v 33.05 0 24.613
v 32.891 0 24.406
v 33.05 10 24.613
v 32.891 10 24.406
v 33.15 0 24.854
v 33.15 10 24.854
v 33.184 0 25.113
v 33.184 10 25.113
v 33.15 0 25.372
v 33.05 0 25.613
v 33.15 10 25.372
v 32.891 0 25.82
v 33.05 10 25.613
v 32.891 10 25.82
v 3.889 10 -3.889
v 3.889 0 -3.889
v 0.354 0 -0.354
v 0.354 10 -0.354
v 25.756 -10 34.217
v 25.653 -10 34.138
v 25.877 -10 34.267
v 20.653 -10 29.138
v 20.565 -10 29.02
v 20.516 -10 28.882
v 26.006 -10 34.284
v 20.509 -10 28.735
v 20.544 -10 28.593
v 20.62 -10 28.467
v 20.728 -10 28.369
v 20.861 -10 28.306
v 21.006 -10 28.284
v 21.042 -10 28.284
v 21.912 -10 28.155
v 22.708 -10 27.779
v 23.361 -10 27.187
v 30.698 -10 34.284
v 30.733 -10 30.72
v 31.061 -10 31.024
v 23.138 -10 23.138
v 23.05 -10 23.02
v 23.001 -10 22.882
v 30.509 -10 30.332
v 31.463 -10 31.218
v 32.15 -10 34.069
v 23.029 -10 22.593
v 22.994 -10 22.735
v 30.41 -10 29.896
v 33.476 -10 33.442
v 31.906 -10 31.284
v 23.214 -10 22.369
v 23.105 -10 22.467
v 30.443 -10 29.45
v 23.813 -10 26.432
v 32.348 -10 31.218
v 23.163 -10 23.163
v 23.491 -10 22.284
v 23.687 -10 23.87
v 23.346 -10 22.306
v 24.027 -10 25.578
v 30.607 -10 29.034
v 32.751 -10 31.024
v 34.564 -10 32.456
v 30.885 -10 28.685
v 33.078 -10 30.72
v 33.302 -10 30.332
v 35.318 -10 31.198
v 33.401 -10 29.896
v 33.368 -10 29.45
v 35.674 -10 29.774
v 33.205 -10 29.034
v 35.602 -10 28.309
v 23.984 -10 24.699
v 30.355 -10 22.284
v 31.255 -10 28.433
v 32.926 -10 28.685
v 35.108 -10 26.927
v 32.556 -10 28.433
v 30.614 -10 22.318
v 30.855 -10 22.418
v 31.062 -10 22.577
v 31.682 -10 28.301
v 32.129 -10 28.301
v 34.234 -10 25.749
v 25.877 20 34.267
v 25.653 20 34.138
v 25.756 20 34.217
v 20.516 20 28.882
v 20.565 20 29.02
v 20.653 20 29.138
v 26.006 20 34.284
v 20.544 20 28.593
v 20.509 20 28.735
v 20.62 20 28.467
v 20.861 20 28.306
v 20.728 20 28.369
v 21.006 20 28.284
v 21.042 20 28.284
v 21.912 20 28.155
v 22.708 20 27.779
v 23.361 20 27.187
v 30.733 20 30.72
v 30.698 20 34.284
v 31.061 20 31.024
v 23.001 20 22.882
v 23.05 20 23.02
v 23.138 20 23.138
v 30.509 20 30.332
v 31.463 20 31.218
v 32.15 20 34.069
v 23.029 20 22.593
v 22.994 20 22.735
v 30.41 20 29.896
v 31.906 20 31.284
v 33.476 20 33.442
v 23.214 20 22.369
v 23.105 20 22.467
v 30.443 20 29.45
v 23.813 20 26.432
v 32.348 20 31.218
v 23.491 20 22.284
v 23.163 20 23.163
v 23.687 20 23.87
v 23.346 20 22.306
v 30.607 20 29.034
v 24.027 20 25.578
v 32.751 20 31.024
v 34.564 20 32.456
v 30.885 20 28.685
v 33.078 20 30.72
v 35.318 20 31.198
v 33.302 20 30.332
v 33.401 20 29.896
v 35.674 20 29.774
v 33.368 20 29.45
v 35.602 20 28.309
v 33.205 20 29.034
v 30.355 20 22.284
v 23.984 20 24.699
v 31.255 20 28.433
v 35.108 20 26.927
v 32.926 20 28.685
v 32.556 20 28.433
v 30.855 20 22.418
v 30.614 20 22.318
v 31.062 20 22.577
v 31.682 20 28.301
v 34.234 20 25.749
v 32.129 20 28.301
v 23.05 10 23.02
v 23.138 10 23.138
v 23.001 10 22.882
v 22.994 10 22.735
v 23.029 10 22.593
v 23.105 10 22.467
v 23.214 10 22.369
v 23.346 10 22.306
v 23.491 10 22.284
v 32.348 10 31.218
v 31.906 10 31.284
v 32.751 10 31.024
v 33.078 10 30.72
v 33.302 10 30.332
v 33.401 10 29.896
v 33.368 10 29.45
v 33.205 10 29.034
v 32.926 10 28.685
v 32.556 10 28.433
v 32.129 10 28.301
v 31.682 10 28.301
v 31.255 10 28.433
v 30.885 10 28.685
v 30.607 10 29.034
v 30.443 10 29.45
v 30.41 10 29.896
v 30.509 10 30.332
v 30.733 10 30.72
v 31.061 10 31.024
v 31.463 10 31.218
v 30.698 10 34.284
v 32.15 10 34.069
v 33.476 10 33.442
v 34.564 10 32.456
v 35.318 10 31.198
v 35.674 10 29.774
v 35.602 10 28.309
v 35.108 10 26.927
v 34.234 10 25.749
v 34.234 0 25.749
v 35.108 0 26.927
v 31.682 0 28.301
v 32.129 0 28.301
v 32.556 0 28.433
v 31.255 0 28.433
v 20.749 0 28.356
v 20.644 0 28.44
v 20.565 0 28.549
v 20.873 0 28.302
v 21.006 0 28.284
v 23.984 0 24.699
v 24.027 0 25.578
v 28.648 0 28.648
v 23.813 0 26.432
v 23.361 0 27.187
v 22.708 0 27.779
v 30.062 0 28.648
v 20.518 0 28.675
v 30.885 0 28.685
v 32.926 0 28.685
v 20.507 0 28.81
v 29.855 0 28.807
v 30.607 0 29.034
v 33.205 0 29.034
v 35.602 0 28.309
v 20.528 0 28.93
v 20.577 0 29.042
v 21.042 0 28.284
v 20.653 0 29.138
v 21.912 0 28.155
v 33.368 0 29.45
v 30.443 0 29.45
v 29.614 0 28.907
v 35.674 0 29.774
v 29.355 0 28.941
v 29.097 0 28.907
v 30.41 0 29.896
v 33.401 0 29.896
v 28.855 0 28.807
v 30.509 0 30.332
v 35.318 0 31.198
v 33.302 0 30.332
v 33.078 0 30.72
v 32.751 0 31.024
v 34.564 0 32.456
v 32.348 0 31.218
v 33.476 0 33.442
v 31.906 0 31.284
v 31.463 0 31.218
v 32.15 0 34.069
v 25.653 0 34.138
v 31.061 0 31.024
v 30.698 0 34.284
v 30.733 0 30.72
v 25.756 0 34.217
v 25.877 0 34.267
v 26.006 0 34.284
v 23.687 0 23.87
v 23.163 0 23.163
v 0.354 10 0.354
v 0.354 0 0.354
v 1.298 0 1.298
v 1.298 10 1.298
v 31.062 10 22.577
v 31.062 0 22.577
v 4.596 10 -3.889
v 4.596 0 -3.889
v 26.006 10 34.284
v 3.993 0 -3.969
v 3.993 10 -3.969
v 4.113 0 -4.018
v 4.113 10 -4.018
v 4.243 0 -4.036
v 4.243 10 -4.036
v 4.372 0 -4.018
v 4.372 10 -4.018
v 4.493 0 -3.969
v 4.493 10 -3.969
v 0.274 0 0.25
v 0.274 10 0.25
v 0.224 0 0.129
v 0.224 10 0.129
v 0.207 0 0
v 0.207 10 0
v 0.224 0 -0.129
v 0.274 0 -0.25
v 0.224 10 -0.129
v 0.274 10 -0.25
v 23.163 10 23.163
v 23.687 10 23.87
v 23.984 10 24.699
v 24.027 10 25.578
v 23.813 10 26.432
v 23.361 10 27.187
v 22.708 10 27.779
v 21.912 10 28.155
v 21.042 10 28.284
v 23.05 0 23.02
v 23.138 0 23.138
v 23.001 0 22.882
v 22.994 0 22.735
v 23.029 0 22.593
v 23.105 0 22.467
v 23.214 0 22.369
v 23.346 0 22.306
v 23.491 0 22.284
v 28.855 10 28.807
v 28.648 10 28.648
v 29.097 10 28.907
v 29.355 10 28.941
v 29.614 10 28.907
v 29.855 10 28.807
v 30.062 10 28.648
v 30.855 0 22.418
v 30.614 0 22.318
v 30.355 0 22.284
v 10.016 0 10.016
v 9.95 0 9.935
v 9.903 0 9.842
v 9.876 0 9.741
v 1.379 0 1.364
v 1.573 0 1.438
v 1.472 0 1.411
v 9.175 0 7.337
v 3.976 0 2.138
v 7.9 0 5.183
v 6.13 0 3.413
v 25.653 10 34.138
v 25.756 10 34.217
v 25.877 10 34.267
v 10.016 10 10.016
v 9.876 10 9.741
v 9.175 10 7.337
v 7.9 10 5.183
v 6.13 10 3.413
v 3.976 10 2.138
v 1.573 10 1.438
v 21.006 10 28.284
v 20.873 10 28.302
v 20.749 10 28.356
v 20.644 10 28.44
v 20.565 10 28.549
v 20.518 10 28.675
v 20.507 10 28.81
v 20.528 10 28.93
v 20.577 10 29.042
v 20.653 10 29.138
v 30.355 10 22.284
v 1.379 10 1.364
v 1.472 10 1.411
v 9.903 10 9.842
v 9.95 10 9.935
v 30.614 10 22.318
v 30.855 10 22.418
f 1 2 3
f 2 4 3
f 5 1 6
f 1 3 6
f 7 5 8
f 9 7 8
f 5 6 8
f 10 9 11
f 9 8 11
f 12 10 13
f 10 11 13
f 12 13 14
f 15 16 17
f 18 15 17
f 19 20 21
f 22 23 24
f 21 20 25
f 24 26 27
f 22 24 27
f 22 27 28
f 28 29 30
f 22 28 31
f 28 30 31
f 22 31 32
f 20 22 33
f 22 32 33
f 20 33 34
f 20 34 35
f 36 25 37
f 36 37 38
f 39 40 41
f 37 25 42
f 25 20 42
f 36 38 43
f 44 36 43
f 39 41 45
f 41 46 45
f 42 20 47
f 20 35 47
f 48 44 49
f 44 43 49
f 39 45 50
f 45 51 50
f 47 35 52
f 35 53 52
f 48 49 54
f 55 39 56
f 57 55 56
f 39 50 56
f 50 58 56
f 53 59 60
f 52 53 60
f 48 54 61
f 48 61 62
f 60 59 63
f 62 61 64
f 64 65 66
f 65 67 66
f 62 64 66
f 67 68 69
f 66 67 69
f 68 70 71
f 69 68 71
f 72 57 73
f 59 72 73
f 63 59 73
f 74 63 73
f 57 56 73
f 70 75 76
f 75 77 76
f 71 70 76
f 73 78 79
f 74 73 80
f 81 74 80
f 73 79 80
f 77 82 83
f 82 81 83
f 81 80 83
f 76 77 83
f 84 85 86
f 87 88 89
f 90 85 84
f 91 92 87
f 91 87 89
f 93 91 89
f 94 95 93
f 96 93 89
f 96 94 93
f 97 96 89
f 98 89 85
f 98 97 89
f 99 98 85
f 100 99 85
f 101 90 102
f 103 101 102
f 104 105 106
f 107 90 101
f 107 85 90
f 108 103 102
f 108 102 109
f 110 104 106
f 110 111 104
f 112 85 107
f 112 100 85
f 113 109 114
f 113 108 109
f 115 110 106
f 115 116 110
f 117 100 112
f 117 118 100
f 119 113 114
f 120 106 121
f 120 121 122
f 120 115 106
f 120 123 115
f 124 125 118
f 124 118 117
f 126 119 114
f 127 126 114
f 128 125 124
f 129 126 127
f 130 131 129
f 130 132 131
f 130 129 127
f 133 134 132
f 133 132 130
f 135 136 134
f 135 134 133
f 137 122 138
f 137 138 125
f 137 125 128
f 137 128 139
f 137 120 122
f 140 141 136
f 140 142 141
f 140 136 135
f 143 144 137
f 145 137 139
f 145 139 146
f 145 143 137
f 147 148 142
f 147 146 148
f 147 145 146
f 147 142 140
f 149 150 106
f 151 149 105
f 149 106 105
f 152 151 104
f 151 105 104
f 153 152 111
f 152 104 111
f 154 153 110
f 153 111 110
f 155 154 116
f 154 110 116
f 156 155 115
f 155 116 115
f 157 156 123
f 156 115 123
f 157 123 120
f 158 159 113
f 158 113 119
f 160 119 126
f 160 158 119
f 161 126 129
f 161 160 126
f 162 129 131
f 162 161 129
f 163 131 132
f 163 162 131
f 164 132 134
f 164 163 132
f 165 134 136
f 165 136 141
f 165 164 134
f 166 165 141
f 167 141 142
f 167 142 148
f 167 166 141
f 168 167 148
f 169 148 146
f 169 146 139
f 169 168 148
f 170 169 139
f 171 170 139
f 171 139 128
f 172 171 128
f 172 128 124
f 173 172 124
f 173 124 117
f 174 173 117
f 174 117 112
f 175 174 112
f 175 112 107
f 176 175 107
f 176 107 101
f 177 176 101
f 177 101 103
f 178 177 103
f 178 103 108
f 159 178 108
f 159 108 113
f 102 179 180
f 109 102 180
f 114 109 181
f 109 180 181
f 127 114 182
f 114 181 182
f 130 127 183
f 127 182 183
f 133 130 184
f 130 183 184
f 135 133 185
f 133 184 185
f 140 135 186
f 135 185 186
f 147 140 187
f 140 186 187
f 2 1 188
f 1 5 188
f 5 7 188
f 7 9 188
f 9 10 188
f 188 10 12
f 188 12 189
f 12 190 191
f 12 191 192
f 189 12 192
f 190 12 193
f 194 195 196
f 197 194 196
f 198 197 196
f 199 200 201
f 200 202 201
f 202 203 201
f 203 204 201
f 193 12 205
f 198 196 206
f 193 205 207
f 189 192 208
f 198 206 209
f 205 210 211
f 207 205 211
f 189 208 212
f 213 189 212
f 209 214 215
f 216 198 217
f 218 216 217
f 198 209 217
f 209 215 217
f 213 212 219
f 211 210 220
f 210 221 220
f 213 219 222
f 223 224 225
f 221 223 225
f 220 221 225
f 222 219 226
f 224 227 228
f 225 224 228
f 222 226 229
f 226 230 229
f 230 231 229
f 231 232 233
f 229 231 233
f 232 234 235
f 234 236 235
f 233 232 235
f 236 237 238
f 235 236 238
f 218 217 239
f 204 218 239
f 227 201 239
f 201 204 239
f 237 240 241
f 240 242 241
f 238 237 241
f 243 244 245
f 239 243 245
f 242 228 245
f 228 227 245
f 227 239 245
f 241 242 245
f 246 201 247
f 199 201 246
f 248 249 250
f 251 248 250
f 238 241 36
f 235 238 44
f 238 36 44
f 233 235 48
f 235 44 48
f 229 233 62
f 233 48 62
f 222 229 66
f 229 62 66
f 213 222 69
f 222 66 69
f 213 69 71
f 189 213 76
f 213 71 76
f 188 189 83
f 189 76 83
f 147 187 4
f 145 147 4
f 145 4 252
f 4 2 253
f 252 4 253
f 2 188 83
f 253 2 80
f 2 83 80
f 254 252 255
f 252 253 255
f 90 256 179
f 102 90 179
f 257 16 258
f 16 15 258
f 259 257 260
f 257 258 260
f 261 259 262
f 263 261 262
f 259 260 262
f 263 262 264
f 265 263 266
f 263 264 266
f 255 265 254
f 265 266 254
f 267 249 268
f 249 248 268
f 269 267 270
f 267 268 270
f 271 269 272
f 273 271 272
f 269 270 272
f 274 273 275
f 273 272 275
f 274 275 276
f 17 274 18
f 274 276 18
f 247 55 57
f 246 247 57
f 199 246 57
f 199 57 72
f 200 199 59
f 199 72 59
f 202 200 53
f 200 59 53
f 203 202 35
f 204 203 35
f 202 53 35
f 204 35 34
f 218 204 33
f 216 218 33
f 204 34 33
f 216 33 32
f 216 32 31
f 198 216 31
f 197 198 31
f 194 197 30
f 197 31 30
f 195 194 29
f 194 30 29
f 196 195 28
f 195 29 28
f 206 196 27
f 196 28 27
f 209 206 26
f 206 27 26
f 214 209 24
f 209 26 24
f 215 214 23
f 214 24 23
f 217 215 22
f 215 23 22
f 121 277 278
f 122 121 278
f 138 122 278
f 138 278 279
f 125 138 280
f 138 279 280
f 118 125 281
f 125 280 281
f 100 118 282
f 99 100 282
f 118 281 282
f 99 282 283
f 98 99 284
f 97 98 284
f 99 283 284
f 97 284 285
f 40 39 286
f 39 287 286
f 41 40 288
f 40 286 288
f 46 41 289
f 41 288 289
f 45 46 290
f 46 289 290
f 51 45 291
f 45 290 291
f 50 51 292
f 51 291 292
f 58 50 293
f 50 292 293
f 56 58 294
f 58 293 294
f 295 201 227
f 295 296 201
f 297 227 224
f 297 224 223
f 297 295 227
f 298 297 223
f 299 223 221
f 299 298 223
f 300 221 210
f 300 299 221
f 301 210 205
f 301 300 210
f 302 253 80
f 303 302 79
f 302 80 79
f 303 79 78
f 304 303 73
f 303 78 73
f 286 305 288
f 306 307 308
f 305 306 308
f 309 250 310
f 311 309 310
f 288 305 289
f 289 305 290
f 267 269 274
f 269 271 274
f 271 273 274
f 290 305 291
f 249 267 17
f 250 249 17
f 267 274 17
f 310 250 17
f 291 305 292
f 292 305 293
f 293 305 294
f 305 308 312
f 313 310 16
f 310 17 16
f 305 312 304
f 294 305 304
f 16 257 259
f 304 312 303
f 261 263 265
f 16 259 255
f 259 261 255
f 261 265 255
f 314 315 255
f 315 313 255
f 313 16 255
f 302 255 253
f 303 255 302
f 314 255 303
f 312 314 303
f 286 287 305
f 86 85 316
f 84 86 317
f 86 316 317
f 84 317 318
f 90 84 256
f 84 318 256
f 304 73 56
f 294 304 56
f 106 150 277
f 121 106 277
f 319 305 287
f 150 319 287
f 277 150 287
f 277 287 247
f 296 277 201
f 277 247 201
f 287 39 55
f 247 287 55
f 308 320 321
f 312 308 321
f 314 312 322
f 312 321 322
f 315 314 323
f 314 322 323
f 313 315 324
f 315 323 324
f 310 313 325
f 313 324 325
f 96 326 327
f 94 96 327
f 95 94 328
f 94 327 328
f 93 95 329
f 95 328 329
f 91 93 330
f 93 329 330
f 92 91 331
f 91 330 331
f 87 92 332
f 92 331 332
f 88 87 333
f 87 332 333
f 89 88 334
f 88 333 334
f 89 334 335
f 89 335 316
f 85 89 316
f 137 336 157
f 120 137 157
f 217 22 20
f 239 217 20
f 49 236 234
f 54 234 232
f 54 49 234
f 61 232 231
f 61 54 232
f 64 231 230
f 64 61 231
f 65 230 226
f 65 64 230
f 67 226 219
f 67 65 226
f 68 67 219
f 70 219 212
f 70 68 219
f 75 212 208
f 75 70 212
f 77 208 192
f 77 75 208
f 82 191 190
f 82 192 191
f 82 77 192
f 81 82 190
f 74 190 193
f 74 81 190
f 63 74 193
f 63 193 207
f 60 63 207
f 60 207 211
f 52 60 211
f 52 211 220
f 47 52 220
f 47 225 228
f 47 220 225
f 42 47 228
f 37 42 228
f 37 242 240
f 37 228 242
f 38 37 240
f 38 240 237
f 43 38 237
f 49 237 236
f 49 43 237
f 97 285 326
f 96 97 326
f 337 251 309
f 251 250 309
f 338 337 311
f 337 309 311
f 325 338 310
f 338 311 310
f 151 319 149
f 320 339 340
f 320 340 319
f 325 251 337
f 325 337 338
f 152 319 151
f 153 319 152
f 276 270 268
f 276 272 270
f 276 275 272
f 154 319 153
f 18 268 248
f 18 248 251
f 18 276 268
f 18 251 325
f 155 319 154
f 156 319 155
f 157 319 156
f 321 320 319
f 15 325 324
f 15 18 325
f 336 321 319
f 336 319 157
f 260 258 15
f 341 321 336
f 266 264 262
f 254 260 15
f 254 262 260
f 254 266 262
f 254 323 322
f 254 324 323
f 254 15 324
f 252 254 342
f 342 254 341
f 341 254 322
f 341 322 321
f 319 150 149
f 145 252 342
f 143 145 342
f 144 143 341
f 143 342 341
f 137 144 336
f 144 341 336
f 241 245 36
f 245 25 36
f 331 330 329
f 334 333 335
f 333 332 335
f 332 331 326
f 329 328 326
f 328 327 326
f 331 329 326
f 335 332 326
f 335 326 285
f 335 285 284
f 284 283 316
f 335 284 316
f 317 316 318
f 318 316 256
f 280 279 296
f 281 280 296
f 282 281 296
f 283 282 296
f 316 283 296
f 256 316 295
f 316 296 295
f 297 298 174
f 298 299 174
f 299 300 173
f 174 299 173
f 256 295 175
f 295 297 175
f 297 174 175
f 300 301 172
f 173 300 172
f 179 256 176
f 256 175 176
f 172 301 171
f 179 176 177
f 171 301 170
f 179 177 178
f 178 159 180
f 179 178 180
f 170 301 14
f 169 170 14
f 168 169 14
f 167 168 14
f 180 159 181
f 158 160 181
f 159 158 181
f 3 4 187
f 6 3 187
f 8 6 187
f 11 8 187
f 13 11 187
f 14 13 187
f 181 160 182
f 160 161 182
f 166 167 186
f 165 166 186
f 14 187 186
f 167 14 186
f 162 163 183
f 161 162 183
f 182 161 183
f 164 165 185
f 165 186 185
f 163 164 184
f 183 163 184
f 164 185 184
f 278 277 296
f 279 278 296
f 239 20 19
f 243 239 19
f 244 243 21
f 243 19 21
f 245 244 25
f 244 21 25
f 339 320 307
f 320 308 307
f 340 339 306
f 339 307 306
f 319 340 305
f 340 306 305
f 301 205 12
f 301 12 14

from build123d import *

# Parameters (mm, degrees)
SKETCH1_R                = 1.6
BOSS_EXTRUDE1_DEPTH      = 10
CUT_EXTRUDE1_DEPTH       = 51.495476
FILLET1_R                = 0.5
BOSS_EXTRUDE2_DEPTH      = 10
BOSS_EXTRUDE2_DEPTH_BACK = 20
SKETCH3_R                = 1.5
SKETCH4_W                = 10
SKETCH4_H                = 10
CUT_EXTRUDE3_DEPTH       = 54.383453
SKETCH5_W                = 8.66368
SKETCH5_H                = 10
CUT_EXTRUDE5_DEPTH       = 54.831153
FILLET3_R                = 0.5
FILLET4_R                = 1


with BuildPart() as part:
    # Sketch1 → Boss-Extrude1 (new body)
    with BuildSketch(Plane(origin=(0, 0, 0), x_dir=(1, 0, 0), z_dir=(0, 1, 0))):
        with BuildLine():
            Line((0, 0), (23.162951, -23.162951))
            ThreePointArc((23.162951, -23.162951), (23.813269, -26.432322), (21.041631, -28.284271))
            Line((21.041631, -28.284271), (0, -28.284271))
            Line((0, -28.284271), (0, -34.284271))
            Line((0, -34.284271), (30.698485, -34.284271))
            ThreePointArc((30.698485, -34.284271), (35.317882, -31.197688), (34.234019, -25.748737))
            Line((34.234019, -25.748737), (4.242641, 4.242641))
            Line((4.242641, 4.242641), (0, 0))
        make_face()
        with Locations(Location((31.905592, -29.784271, 0), (0, 0, 270))):
            Circle(SKETCH1_R, mode=Mode.SUBTRACT)
    extrude(amount=BOSS_EXTRUDE1_DEPTH)

    # Sketch2 → Cut-Extrude1 (cut, through all)
    with BuildSketch(Plane(origin=(0, 10, 0), x_dir=(1, 0, 0), z_dir=(0, 1, 0))):
        with BuildLine():
            Line((1.414214, -1.414214), (9.899495, -9.899495))
            ThreePointArc((9.899495, -9.899495), (7.071068, -4.242641), (1.414214, -1.414214))
        make_face()
        Polygon((0, -28.284271), (0, -34.284271), (25.79899, -34.284271), (19.79899, -28.284271), align=None)
    extrude(amount=-CUT_EXTRUDE1_DEPTH, mode=Mode.SUBTRACT)

    # Fillet1
    fillet1_edges = [part.edges().sort_by_distance(p)[0] for p in [
        (4.242641, 5, -4.242641),
        (0, 5, 0),
        (19.79899, 5, 28.284271),
        (25.79899, 5, 34.284271),
        (1.414214, 5, 1.414214),
        (9.899495, 5, 9.899495),
    ]]
    fillet(fillet1_edges, radius=FILLET1_R)

    # Sketch3 → Boss-Extrude2 (add, two sides: drawn at the far end of the back side and taken through both)
    with BuildSketch(Plane(origin=(0, 10, 0), x_dir=(1, 0, 0), z_dir=(0, 1, 0)).offset(-BOSS_EXTRUDE2_DEPTH_BACK)):
        with BuildLine():
            Line((20.652543, -29.137825), (25.652543, -34.137825))
            ThreePointArc((25.652543, -34.137825), (25.814755, -34.246211), (26.006097, -34.284271))
            Line((26.006097, -34.284271), (30.698485, -34.284271))
            ThreePointArc((30.698485, -34.284271), (35.317882, -31.197688), (34.234019, -25.748737))
            Line((34.234019, -25.748737), (31.062446, -22.577164))
            ThreePointArc((31.062446, -22.577164), (30.738022, -22.360392), (30.355339, -22.284271))
            Line((30.355339, -22.284271), (22.284271, -22.284271))
            Line((22.284271, -22.284271), (23.162951, -23.162951))
            ThreePointArc((23.162951, -23.162951), (23.813269, -26.432322), (21.041631, -28.284271))
            Line((21.041631, -28.284271), (21.006097, -28.284271))
            ThreePointArc((21.006097, -28.284271), (20.544157, -28.59293), (20.652543, -29.137825))
        make_face()
        with Locations(Location((31.905592, -29.784271, 0), (0, 0, 270))):
            Circle(SKETCH3_R, mode=Mode.SUBTRACT)
    extrude(amount=BOSS_EXTRUDE2_DEPTH + BOSS_EXTRUDE2_DEPTH_BACK)

    # Sketch4 → Cut-Extrude3 (cut, through all)
    with BuildSketch(Plane(origin=(0, 0, 0), x_dir=(0.7071067811865515, 0, 0.7071067811865437), z_dir=(-0.7071067811865437, 0, 0.7071067811865515))):
        with Locations((36.514719, 5)):
            Rectangle(SKETCH4_W, SKETCH4_H)
    extrude(amount=CUT_EXTRUDE3_DEPTH, mode=Mode.SUBTRACT)

    # Sketch5 → Cut-Extrude5 (cut, through all)
    with BuildSketch(Plane(origin=(-4.242641, 0, 4.242641), x_dir=(0.7071067811865476, 0, 0.7071067811865476), z_dir=(-0.7071067811865476, 0, 0.7071067811865476))):
        with Locations((45.846559, 5)):
            Rectangle(SKETCH5_W, SKETCH5_H)
    extrude(amount=-CUT_EXTRUDE5_DEPTH, mode=Mode.SUBTRACT)

    # Fillet3
    fillet3_edges = [part.edges().sort_by_distance(p)[0] for p in [
        (22.284271, -5, 22.284271),
        (22.284271, 15, 22.284271),
    ]]
    fillet(fillet3_edges, radius=FILLET3_R)

    # Fillet4
    fillet4_edges = [part.edges().sort_by_distance(p)[0] for p in [
        (29.355339, 5, 29.355339),
        (33.59798, 5, 25.112698),
    ]]
    fillet(fillet4_edges, radius=FILLET4_R)


solid = part.part
